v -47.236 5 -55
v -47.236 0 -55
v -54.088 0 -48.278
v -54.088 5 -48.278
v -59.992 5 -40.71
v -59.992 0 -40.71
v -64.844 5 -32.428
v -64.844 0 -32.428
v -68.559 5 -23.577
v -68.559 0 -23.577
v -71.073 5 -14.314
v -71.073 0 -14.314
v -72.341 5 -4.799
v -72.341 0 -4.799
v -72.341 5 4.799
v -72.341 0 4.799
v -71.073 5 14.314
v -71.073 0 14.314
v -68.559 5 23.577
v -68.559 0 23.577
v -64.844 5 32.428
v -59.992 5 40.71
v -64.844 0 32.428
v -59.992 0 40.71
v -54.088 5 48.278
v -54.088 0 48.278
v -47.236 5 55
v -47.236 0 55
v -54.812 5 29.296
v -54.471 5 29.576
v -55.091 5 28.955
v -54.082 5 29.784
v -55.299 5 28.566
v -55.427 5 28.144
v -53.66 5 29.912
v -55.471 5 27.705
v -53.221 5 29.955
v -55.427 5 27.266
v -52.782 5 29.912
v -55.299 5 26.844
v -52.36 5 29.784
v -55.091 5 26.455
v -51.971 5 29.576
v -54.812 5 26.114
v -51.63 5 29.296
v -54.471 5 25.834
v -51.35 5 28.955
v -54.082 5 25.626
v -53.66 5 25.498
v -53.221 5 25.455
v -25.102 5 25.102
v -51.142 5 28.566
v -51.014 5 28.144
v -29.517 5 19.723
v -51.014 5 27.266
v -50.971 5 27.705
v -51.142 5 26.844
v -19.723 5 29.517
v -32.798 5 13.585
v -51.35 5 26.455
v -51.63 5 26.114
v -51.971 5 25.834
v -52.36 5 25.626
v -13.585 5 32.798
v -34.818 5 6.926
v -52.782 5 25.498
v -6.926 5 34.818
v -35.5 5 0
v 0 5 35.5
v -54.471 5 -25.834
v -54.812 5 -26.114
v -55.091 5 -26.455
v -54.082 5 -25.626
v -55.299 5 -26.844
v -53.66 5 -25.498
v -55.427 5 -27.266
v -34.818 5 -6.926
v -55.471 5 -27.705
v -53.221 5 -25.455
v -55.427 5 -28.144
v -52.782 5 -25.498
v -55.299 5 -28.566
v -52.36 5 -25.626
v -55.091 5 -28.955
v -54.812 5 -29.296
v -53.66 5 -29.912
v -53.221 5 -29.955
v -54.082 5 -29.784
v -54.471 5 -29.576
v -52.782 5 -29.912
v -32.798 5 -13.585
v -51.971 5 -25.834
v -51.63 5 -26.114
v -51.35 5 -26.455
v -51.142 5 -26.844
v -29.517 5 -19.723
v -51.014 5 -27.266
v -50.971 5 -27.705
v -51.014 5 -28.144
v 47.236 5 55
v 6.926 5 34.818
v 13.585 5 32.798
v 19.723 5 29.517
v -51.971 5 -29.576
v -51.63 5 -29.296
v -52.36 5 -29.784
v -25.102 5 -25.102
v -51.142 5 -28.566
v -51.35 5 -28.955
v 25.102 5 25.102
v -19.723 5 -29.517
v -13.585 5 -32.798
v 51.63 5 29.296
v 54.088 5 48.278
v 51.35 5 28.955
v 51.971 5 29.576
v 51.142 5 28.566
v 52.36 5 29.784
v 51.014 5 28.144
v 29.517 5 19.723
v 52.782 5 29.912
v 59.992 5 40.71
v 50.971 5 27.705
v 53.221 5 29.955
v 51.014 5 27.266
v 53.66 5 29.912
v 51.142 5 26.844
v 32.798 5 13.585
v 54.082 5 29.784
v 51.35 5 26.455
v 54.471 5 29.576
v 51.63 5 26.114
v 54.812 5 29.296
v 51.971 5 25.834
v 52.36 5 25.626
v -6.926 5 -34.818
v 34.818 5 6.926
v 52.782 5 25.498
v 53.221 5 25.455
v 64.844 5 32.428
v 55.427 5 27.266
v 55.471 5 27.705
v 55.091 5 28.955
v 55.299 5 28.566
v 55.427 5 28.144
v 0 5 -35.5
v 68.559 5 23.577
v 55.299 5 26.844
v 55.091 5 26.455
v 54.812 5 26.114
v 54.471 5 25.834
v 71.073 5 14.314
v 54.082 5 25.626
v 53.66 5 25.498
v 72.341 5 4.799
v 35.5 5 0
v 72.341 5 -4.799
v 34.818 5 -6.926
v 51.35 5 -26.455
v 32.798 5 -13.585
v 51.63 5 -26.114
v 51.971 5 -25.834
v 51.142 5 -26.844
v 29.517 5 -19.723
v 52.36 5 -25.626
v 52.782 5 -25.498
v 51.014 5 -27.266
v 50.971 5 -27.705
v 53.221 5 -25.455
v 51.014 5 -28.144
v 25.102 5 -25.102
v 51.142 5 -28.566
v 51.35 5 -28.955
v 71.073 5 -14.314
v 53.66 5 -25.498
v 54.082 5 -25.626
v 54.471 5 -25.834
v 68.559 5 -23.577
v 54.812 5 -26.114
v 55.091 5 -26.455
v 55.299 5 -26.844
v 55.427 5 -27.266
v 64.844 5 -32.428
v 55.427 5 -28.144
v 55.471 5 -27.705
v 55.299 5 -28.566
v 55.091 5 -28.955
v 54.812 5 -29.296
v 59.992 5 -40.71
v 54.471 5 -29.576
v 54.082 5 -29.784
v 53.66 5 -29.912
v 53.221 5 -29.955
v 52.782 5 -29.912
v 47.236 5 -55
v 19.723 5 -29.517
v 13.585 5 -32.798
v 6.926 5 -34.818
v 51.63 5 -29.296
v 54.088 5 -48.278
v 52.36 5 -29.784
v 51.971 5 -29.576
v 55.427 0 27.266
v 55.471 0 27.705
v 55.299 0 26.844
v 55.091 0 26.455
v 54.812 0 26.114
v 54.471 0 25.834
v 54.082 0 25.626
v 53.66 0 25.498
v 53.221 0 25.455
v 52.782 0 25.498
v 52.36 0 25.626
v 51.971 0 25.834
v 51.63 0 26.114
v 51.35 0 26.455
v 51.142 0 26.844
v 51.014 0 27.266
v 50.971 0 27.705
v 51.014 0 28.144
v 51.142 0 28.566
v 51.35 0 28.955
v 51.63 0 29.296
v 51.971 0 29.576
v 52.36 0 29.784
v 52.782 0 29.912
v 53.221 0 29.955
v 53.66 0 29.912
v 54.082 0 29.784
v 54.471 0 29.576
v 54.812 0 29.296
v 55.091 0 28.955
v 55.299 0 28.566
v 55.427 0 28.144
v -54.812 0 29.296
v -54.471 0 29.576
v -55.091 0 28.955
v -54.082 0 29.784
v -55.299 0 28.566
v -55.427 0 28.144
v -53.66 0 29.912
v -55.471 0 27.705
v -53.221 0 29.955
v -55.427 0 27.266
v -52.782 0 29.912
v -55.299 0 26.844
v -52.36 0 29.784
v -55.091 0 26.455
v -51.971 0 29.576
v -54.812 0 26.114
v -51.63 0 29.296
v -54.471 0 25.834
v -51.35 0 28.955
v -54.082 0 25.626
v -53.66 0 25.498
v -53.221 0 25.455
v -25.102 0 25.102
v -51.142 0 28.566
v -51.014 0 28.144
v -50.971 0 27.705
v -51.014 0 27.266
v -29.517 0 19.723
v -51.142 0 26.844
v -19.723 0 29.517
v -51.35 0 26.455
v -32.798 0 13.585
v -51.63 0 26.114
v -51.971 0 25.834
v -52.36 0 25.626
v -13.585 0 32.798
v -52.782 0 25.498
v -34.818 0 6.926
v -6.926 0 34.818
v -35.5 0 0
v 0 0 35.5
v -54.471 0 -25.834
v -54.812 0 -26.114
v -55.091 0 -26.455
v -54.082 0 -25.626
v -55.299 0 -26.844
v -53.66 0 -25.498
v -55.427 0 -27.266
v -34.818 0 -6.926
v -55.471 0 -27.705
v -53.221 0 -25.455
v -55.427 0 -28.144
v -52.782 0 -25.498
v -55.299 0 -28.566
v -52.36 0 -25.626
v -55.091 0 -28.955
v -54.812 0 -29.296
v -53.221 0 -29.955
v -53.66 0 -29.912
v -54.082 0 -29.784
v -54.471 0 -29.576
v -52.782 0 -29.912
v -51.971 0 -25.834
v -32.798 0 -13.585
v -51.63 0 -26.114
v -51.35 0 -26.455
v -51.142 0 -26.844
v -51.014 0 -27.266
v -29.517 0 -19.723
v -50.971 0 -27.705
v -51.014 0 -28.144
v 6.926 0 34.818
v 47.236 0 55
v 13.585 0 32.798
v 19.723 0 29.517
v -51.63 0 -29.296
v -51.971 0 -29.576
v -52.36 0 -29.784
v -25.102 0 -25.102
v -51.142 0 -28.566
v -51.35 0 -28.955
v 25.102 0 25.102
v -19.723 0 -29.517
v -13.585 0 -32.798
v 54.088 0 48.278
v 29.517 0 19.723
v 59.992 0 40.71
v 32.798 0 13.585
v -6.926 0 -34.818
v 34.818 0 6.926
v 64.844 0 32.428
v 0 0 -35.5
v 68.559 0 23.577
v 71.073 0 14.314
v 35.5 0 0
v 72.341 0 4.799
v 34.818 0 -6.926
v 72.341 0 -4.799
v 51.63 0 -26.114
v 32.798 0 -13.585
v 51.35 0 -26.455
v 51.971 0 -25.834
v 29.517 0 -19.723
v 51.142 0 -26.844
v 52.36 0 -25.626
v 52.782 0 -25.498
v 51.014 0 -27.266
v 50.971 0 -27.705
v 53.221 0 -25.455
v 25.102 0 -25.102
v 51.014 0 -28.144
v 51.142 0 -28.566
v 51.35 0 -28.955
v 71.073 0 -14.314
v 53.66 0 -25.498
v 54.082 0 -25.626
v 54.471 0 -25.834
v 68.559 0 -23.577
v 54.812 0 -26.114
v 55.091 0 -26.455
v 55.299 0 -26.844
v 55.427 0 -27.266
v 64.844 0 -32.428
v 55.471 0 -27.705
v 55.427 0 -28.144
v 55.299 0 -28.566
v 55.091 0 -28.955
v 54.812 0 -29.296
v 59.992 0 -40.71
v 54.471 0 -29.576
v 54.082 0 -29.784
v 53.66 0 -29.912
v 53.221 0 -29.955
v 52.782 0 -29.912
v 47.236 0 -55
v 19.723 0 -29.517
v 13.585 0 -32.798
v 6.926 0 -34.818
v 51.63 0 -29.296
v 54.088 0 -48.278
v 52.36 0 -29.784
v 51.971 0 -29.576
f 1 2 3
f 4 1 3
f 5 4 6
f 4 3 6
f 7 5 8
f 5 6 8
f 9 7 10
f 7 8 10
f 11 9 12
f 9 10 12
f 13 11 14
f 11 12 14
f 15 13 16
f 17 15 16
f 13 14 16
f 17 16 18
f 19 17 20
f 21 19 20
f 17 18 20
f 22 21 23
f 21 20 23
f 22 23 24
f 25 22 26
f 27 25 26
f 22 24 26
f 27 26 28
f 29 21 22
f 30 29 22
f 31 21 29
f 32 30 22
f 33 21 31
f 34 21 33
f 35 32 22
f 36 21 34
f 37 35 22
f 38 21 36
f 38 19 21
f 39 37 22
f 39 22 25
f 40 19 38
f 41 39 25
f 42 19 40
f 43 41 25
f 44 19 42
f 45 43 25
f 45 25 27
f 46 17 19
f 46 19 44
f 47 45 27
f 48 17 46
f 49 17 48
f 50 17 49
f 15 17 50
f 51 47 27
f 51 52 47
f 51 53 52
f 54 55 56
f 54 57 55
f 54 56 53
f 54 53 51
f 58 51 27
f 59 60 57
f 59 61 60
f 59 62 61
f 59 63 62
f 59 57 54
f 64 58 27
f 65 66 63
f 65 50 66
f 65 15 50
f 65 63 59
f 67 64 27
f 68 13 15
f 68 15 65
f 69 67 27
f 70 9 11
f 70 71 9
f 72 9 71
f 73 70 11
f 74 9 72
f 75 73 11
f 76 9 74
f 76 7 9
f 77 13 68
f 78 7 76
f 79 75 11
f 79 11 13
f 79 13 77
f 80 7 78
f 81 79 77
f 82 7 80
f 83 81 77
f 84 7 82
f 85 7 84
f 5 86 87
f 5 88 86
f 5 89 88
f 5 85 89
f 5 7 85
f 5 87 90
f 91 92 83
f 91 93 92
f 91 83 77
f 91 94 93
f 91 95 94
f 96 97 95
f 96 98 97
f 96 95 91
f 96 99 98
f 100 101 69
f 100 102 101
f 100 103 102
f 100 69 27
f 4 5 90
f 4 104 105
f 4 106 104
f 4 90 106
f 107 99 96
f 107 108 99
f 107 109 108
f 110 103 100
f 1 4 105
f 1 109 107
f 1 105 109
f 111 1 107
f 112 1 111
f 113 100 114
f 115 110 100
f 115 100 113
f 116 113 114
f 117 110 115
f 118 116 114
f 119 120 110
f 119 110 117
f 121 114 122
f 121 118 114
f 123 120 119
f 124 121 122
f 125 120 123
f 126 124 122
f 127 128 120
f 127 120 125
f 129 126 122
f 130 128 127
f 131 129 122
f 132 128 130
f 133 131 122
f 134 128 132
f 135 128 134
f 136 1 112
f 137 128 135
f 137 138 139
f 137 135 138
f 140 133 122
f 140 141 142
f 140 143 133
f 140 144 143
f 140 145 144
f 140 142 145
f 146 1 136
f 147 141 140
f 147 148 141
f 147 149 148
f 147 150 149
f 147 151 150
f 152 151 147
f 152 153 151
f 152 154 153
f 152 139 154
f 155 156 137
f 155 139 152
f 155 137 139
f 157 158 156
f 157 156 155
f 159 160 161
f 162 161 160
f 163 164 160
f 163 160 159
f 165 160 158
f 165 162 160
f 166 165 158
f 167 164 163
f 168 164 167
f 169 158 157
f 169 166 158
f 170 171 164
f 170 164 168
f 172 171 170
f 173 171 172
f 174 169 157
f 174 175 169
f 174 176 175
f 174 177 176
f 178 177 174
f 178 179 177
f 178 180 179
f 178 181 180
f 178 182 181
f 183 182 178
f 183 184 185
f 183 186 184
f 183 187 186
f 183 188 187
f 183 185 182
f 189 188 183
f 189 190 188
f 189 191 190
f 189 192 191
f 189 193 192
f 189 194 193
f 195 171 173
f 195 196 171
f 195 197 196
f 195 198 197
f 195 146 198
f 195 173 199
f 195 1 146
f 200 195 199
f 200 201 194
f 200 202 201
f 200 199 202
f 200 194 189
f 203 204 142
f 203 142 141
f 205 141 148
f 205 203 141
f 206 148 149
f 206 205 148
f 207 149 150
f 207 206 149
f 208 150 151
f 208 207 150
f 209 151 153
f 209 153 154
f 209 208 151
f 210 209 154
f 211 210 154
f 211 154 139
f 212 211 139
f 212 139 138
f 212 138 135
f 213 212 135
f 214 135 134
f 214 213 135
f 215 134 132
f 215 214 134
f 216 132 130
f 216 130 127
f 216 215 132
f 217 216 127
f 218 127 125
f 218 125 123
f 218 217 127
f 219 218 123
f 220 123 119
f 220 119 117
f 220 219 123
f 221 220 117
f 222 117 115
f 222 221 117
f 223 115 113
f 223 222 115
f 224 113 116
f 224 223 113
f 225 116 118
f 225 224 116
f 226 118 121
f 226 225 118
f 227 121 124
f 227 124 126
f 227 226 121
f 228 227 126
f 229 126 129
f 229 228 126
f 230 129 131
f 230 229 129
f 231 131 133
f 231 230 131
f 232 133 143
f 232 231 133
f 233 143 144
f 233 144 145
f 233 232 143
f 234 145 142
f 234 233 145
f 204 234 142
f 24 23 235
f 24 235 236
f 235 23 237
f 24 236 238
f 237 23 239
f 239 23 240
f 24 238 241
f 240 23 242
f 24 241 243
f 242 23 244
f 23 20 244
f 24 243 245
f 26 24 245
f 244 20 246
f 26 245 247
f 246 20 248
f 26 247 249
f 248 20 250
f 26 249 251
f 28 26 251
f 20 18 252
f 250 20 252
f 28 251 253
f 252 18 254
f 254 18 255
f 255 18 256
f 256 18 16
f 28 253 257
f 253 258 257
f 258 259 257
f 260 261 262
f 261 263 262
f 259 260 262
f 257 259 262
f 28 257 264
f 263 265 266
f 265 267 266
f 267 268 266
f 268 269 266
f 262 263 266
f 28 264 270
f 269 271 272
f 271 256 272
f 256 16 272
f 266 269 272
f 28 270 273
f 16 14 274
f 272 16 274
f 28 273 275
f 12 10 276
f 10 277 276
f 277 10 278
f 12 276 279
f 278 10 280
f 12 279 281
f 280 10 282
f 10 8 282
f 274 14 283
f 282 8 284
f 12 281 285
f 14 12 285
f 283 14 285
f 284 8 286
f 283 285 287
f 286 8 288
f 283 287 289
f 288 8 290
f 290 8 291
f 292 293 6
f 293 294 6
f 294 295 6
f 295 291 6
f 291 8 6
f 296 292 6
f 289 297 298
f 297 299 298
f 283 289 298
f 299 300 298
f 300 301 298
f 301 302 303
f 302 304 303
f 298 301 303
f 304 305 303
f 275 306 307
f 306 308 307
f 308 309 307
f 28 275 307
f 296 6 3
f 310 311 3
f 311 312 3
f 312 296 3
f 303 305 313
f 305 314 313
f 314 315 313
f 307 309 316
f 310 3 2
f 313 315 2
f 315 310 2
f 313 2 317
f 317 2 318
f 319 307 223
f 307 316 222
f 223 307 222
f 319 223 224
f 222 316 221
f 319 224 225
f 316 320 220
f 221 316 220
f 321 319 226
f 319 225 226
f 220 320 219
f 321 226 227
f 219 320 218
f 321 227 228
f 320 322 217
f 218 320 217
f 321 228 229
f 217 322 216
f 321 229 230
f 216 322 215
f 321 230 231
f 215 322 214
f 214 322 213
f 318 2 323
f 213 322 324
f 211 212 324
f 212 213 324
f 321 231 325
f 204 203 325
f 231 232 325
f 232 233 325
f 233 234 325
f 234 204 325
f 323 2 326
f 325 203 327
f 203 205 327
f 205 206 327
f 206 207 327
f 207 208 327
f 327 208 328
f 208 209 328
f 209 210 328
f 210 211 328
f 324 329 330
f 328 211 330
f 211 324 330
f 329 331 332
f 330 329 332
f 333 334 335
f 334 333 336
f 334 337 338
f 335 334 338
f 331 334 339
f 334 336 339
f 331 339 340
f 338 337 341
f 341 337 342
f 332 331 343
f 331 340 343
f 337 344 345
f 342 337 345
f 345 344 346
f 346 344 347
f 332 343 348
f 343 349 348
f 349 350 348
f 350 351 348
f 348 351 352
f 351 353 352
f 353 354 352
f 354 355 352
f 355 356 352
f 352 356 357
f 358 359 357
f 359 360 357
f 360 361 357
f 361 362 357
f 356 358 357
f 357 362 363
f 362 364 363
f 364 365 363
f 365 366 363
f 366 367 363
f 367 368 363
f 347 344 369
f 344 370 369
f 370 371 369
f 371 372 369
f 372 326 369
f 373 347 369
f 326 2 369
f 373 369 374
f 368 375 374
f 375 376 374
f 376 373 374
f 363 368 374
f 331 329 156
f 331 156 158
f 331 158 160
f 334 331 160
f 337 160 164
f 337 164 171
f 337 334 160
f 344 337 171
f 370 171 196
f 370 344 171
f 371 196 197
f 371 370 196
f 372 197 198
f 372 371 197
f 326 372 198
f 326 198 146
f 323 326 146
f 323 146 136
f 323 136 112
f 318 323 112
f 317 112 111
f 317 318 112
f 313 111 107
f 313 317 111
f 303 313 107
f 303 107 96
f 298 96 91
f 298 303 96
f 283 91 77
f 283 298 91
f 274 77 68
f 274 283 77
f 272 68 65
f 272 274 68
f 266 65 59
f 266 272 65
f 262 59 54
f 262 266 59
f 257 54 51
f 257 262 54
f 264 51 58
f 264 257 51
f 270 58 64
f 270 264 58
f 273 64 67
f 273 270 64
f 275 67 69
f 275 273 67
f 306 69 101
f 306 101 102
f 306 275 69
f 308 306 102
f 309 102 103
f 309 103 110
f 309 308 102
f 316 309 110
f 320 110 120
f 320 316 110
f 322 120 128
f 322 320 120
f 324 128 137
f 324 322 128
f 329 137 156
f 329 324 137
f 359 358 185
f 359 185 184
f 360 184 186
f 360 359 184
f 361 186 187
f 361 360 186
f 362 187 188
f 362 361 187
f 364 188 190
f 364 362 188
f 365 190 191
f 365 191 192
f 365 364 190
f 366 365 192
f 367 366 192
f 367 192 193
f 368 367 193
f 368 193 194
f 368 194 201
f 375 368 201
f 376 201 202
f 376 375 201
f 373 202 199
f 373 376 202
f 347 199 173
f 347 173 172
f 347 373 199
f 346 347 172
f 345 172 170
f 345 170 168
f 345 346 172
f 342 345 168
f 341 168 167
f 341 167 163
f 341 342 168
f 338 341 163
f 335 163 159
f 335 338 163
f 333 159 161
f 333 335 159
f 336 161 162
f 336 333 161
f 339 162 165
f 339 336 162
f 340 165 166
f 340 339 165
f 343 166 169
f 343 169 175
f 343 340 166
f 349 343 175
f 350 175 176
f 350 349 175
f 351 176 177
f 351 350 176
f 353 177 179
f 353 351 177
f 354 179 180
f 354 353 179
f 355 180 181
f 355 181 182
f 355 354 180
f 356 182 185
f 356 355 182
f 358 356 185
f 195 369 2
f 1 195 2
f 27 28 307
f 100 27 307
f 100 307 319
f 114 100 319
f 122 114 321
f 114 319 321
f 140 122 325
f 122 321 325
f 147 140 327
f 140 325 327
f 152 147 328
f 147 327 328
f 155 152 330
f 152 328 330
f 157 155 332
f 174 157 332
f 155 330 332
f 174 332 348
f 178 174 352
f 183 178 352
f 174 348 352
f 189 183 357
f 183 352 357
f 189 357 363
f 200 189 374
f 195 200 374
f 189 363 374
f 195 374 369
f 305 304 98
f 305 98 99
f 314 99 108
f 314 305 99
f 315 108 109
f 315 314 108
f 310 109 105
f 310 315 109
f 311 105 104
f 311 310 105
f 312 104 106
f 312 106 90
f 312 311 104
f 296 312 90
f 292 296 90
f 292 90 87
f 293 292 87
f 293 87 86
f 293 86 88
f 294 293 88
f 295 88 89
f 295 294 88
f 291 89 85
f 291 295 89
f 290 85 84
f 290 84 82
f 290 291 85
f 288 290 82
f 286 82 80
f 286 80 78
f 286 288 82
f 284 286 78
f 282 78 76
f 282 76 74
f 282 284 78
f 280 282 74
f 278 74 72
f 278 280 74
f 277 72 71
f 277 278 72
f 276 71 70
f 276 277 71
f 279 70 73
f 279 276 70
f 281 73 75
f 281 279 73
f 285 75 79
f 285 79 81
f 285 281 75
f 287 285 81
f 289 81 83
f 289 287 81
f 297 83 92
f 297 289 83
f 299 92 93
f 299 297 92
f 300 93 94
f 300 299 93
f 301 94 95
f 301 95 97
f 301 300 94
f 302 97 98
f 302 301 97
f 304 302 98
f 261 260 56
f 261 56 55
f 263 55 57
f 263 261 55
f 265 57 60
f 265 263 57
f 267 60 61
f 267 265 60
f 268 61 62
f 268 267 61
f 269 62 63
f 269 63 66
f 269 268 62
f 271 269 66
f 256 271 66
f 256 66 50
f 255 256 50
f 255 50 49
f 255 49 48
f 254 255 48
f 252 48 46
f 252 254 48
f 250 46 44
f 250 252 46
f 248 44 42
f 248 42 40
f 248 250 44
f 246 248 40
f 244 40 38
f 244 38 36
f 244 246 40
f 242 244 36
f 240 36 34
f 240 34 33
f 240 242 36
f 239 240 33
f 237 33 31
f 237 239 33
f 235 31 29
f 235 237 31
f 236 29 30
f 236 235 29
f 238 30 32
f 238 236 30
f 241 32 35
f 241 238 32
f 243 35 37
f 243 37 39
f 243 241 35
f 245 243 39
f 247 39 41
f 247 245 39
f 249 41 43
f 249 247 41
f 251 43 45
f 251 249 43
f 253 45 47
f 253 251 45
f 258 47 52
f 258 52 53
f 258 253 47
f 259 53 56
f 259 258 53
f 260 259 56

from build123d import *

# Parameters (mm, degrees)
SKETCH_1_R      = 35.5
SKETCH_1_R_2    = 2.25
EXTRUDE_1_DEPTH = 5


with BuildPart() as part:
    # Эскиз1 → Бобышка-Вытянуть1 (new body)
    with BuildSketch(Plane(origin=(0, 0, 0), x_dir=(1, 0, 0), z_dir=(0, 1, 0))):
        with BuildLine():
            Line((-47.236109069, -55), (47.236109069, -55))
            ThreePointArc((47.236109069, -55), (72.5, 0), (47.236109069, 55))
            Line((47.236109069, 55), (-47.236109069, 55))
            ThreePointArc((-47.236109069, 55), (-72.5, 0), (-47.236109069, -55))
        make_face()
        Circle(SKETCH_1_R, mode=Mode.SUBTRACT)
        with Locations((53.220649991, 27.704916794)):
            Circle(SKETCH_1_R_2, mode=Mode.SUBTRACT)
        with Locations((53.220649991, -27.704916794)):
            Circle(SKETCH_1_R_2, mode=Mode.SUBTRACT)
        with Locations((-53.220649991, -27.704916794)):
            Circle(SKETCH_1_R_2, mode=Mode.SUBTRACT)
        with Locations((-53.220649991, 27.704916794)):
            Circle(SKETCH_1_R_2, mode=Mode.SUBTRACT)
    extrude(amount=EXTRUDE_1_DEPTH)


solid = part.part
